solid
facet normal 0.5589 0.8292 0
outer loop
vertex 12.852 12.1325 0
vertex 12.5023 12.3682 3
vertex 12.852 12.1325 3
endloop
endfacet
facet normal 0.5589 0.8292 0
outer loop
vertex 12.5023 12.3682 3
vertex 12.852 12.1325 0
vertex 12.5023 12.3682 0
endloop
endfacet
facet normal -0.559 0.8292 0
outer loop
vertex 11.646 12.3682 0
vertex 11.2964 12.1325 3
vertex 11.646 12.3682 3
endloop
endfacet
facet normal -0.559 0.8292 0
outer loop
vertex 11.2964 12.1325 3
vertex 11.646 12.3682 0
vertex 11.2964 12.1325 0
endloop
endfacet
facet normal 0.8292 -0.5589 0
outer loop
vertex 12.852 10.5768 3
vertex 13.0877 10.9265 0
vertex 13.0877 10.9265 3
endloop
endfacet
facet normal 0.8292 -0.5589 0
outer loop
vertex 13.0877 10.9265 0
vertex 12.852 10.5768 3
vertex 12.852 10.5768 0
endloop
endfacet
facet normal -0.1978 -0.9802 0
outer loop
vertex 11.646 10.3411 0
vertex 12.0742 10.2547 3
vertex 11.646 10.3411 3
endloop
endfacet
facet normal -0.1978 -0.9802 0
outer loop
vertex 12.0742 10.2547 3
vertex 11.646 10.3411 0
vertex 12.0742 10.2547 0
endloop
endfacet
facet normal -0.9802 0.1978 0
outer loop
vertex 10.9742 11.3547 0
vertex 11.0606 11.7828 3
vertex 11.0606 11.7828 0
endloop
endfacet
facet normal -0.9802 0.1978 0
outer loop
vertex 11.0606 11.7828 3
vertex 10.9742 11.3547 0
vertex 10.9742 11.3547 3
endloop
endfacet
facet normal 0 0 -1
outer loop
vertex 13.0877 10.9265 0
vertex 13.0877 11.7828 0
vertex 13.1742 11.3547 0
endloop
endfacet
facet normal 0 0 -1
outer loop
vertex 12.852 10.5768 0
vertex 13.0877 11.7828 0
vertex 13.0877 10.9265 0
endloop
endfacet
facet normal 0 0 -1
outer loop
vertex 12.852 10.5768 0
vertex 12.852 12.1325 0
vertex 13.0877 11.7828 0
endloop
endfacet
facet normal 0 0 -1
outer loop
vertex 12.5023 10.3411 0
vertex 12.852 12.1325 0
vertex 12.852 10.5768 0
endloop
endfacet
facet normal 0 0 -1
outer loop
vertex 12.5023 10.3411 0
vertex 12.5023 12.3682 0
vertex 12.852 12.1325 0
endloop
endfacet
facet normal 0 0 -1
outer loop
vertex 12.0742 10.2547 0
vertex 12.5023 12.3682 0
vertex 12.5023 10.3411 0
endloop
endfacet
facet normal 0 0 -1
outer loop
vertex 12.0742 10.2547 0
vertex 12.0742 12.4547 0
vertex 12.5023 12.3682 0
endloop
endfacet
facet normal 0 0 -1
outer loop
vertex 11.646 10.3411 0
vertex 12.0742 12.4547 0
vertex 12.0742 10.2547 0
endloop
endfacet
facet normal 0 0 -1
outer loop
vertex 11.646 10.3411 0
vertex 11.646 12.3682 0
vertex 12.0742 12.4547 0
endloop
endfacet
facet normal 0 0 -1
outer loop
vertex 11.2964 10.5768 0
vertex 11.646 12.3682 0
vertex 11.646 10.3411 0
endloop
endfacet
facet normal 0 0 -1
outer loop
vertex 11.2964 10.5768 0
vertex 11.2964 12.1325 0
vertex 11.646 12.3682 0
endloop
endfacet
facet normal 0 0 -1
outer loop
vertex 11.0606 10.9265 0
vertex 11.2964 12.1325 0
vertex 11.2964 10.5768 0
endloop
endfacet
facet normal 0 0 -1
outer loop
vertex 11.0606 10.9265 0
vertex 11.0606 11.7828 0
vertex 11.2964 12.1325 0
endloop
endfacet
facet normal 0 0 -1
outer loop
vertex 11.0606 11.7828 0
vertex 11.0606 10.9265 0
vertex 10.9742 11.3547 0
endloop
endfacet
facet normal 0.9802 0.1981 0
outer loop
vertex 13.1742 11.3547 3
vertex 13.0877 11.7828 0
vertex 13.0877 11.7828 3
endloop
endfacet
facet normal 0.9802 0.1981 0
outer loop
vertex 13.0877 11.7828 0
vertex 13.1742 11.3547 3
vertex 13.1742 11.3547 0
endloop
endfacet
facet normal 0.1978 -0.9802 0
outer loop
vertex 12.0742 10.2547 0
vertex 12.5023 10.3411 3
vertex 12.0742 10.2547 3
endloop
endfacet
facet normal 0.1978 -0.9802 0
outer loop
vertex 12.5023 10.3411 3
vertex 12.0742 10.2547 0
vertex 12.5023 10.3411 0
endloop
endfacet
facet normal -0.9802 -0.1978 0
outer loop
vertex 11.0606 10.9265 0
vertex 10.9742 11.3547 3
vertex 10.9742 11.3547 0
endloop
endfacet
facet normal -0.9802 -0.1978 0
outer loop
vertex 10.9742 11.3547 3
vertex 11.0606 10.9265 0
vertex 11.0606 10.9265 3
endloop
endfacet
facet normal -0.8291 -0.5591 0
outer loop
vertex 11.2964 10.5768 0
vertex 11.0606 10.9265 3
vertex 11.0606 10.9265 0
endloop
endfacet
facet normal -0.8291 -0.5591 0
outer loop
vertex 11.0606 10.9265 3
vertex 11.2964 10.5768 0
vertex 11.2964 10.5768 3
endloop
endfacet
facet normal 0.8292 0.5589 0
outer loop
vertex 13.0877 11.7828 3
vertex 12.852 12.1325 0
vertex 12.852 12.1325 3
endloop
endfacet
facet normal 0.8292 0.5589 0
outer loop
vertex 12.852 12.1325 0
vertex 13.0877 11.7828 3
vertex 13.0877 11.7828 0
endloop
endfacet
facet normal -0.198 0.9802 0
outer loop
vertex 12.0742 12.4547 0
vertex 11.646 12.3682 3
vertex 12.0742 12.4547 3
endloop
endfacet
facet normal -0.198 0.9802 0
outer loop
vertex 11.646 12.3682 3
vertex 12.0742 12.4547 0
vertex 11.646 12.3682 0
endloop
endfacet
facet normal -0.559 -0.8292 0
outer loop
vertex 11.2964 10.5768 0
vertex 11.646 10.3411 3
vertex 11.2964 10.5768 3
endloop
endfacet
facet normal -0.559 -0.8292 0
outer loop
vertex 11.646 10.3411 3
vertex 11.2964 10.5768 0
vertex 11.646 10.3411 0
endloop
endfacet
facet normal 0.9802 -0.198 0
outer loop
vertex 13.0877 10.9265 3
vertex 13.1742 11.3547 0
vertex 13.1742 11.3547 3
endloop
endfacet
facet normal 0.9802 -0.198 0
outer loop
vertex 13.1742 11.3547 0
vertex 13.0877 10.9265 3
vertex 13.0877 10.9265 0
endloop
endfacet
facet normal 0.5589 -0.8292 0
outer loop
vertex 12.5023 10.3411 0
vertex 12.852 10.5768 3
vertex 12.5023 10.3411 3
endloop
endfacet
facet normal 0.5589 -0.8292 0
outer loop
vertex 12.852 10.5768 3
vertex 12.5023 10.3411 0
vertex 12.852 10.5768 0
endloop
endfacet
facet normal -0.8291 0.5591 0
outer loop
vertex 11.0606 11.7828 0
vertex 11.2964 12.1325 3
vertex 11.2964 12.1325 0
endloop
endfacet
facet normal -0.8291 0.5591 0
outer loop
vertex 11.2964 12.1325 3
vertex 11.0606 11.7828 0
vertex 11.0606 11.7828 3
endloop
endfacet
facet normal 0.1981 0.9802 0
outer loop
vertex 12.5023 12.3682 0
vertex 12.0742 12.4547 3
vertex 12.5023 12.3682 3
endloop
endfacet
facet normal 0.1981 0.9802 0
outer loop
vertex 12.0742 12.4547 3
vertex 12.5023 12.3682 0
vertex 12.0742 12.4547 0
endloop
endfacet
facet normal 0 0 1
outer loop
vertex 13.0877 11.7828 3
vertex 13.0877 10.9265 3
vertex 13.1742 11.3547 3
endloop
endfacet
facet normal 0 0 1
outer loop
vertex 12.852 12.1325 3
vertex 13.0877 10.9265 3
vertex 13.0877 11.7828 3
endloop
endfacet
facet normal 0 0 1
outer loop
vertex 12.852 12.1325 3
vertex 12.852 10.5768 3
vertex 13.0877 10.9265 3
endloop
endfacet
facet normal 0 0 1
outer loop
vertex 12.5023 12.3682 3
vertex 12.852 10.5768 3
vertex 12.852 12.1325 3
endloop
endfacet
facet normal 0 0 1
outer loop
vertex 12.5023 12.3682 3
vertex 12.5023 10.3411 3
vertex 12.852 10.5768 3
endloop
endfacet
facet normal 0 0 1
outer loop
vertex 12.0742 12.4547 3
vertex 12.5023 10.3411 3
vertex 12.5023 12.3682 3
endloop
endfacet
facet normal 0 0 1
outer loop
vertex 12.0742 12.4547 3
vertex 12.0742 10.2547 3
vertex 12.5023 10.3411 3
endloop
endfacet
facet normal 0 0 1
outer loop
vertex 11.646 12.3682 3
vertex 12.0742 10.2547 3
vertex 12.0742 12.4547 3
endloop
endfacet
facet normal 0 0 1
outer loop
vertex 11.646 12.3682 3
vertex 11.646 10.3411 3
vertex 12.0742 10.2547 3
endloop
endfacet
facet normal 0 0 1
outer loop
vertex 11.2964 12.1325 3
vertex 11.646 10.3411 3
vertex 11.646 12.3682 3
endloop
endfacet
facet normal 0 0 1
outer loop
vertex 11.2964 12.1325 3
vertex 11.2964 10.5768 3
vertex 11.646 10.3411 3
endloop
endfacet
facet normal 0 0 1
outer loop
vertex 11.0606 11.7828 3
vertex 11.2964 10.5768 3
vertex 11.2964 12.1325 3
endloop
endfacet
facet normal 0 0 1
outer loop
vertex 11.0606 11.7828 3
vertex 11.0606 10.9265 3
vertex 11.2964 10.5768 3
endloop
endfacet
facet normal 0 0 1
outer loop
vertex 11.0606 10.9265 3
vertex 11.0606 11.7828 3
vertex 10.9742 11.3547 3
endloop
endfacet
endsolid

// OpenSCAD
// Module names are of the form poly_<inkscape-path-id>().  As a result,
// you can associate a polygon in this OpenSCAD program with the corresponding
// SVG element in the Inkscape document by looking for the XML element with
// the attribute id="inkscape-path-id".

// fudge value is used to ensure that subtracted solids are a tad taller
// in the z dimension than the polygon being subtracted from.  This helps
// keep the resulting .stl file manifold.
fudge = 0.1;

module poly_path84(h)
{
  scale([25.4/90, -25.4/90, 1]) union()
  {
    linear_extrude(height=h)
      polygon([[46.680189,-40.233086],[46.373892,-38.715945],[45.538593,-37.477032],[44.299680,-36.641733],[42.782539,-36.335437],[41.265398,-36.641733],[40.026484,-37.477032],[39.191186,-38.715945],[38.884889,-40.233086],[39.191186,-41.750228],[40.026484,-42.989141],[41.265398,-43.824440],[42.782539,-44.130736],[44.299680,-43.824440],[45.538593,-42.989141],[46.373892,-41.750228],[46.680189,-40.233086]]);
  }
}

module poly_path188(h)
{
  scale([25.4/90, -25.4/90, 1]) union()
  {
    linear_extrude(height=h)
      polygon([[-44.908082,44.130736],[-44.908082,40.587425]]);
  }
}

module poly_path80(h)
{
  scale([25.4/90, -25.4/90, 1]) union()
  {
    linear_extrude(height=h)
      polygon([[46.680188,-40.233082],[46.373892,-38.715941],[45.538595,-37.477027],[44.299683,-36.641729],[42.782543,-36.335432],[41.265401,-36.641729],[40.026487,-37.477027],[39.191187,-38.715941],[38.884890,-40.233082],[39.191187,-41.750223],[40.026487,-42.989136],[41.265401,-43.824434],[42.782543,-44.130731],[44.299683,-43.824434],[45.538595,-42.989136],[46.373892,-41.750223],[46.680188,-40.233082]]);
  }
}

module poly_path186(h)
{
  scale([25.4/90, -25.4/90, 1]) union()
  {
    linear_extrude(height=h)
      polygon([[-43.136877,42.358631],[-46.680189,42.358631]]);
  }
}

module pcb_details(h)
{

poly_path84(h);
poly_path188(h);
poly_path80(h);
poly_path186(h);
}

pcb_details(3);
